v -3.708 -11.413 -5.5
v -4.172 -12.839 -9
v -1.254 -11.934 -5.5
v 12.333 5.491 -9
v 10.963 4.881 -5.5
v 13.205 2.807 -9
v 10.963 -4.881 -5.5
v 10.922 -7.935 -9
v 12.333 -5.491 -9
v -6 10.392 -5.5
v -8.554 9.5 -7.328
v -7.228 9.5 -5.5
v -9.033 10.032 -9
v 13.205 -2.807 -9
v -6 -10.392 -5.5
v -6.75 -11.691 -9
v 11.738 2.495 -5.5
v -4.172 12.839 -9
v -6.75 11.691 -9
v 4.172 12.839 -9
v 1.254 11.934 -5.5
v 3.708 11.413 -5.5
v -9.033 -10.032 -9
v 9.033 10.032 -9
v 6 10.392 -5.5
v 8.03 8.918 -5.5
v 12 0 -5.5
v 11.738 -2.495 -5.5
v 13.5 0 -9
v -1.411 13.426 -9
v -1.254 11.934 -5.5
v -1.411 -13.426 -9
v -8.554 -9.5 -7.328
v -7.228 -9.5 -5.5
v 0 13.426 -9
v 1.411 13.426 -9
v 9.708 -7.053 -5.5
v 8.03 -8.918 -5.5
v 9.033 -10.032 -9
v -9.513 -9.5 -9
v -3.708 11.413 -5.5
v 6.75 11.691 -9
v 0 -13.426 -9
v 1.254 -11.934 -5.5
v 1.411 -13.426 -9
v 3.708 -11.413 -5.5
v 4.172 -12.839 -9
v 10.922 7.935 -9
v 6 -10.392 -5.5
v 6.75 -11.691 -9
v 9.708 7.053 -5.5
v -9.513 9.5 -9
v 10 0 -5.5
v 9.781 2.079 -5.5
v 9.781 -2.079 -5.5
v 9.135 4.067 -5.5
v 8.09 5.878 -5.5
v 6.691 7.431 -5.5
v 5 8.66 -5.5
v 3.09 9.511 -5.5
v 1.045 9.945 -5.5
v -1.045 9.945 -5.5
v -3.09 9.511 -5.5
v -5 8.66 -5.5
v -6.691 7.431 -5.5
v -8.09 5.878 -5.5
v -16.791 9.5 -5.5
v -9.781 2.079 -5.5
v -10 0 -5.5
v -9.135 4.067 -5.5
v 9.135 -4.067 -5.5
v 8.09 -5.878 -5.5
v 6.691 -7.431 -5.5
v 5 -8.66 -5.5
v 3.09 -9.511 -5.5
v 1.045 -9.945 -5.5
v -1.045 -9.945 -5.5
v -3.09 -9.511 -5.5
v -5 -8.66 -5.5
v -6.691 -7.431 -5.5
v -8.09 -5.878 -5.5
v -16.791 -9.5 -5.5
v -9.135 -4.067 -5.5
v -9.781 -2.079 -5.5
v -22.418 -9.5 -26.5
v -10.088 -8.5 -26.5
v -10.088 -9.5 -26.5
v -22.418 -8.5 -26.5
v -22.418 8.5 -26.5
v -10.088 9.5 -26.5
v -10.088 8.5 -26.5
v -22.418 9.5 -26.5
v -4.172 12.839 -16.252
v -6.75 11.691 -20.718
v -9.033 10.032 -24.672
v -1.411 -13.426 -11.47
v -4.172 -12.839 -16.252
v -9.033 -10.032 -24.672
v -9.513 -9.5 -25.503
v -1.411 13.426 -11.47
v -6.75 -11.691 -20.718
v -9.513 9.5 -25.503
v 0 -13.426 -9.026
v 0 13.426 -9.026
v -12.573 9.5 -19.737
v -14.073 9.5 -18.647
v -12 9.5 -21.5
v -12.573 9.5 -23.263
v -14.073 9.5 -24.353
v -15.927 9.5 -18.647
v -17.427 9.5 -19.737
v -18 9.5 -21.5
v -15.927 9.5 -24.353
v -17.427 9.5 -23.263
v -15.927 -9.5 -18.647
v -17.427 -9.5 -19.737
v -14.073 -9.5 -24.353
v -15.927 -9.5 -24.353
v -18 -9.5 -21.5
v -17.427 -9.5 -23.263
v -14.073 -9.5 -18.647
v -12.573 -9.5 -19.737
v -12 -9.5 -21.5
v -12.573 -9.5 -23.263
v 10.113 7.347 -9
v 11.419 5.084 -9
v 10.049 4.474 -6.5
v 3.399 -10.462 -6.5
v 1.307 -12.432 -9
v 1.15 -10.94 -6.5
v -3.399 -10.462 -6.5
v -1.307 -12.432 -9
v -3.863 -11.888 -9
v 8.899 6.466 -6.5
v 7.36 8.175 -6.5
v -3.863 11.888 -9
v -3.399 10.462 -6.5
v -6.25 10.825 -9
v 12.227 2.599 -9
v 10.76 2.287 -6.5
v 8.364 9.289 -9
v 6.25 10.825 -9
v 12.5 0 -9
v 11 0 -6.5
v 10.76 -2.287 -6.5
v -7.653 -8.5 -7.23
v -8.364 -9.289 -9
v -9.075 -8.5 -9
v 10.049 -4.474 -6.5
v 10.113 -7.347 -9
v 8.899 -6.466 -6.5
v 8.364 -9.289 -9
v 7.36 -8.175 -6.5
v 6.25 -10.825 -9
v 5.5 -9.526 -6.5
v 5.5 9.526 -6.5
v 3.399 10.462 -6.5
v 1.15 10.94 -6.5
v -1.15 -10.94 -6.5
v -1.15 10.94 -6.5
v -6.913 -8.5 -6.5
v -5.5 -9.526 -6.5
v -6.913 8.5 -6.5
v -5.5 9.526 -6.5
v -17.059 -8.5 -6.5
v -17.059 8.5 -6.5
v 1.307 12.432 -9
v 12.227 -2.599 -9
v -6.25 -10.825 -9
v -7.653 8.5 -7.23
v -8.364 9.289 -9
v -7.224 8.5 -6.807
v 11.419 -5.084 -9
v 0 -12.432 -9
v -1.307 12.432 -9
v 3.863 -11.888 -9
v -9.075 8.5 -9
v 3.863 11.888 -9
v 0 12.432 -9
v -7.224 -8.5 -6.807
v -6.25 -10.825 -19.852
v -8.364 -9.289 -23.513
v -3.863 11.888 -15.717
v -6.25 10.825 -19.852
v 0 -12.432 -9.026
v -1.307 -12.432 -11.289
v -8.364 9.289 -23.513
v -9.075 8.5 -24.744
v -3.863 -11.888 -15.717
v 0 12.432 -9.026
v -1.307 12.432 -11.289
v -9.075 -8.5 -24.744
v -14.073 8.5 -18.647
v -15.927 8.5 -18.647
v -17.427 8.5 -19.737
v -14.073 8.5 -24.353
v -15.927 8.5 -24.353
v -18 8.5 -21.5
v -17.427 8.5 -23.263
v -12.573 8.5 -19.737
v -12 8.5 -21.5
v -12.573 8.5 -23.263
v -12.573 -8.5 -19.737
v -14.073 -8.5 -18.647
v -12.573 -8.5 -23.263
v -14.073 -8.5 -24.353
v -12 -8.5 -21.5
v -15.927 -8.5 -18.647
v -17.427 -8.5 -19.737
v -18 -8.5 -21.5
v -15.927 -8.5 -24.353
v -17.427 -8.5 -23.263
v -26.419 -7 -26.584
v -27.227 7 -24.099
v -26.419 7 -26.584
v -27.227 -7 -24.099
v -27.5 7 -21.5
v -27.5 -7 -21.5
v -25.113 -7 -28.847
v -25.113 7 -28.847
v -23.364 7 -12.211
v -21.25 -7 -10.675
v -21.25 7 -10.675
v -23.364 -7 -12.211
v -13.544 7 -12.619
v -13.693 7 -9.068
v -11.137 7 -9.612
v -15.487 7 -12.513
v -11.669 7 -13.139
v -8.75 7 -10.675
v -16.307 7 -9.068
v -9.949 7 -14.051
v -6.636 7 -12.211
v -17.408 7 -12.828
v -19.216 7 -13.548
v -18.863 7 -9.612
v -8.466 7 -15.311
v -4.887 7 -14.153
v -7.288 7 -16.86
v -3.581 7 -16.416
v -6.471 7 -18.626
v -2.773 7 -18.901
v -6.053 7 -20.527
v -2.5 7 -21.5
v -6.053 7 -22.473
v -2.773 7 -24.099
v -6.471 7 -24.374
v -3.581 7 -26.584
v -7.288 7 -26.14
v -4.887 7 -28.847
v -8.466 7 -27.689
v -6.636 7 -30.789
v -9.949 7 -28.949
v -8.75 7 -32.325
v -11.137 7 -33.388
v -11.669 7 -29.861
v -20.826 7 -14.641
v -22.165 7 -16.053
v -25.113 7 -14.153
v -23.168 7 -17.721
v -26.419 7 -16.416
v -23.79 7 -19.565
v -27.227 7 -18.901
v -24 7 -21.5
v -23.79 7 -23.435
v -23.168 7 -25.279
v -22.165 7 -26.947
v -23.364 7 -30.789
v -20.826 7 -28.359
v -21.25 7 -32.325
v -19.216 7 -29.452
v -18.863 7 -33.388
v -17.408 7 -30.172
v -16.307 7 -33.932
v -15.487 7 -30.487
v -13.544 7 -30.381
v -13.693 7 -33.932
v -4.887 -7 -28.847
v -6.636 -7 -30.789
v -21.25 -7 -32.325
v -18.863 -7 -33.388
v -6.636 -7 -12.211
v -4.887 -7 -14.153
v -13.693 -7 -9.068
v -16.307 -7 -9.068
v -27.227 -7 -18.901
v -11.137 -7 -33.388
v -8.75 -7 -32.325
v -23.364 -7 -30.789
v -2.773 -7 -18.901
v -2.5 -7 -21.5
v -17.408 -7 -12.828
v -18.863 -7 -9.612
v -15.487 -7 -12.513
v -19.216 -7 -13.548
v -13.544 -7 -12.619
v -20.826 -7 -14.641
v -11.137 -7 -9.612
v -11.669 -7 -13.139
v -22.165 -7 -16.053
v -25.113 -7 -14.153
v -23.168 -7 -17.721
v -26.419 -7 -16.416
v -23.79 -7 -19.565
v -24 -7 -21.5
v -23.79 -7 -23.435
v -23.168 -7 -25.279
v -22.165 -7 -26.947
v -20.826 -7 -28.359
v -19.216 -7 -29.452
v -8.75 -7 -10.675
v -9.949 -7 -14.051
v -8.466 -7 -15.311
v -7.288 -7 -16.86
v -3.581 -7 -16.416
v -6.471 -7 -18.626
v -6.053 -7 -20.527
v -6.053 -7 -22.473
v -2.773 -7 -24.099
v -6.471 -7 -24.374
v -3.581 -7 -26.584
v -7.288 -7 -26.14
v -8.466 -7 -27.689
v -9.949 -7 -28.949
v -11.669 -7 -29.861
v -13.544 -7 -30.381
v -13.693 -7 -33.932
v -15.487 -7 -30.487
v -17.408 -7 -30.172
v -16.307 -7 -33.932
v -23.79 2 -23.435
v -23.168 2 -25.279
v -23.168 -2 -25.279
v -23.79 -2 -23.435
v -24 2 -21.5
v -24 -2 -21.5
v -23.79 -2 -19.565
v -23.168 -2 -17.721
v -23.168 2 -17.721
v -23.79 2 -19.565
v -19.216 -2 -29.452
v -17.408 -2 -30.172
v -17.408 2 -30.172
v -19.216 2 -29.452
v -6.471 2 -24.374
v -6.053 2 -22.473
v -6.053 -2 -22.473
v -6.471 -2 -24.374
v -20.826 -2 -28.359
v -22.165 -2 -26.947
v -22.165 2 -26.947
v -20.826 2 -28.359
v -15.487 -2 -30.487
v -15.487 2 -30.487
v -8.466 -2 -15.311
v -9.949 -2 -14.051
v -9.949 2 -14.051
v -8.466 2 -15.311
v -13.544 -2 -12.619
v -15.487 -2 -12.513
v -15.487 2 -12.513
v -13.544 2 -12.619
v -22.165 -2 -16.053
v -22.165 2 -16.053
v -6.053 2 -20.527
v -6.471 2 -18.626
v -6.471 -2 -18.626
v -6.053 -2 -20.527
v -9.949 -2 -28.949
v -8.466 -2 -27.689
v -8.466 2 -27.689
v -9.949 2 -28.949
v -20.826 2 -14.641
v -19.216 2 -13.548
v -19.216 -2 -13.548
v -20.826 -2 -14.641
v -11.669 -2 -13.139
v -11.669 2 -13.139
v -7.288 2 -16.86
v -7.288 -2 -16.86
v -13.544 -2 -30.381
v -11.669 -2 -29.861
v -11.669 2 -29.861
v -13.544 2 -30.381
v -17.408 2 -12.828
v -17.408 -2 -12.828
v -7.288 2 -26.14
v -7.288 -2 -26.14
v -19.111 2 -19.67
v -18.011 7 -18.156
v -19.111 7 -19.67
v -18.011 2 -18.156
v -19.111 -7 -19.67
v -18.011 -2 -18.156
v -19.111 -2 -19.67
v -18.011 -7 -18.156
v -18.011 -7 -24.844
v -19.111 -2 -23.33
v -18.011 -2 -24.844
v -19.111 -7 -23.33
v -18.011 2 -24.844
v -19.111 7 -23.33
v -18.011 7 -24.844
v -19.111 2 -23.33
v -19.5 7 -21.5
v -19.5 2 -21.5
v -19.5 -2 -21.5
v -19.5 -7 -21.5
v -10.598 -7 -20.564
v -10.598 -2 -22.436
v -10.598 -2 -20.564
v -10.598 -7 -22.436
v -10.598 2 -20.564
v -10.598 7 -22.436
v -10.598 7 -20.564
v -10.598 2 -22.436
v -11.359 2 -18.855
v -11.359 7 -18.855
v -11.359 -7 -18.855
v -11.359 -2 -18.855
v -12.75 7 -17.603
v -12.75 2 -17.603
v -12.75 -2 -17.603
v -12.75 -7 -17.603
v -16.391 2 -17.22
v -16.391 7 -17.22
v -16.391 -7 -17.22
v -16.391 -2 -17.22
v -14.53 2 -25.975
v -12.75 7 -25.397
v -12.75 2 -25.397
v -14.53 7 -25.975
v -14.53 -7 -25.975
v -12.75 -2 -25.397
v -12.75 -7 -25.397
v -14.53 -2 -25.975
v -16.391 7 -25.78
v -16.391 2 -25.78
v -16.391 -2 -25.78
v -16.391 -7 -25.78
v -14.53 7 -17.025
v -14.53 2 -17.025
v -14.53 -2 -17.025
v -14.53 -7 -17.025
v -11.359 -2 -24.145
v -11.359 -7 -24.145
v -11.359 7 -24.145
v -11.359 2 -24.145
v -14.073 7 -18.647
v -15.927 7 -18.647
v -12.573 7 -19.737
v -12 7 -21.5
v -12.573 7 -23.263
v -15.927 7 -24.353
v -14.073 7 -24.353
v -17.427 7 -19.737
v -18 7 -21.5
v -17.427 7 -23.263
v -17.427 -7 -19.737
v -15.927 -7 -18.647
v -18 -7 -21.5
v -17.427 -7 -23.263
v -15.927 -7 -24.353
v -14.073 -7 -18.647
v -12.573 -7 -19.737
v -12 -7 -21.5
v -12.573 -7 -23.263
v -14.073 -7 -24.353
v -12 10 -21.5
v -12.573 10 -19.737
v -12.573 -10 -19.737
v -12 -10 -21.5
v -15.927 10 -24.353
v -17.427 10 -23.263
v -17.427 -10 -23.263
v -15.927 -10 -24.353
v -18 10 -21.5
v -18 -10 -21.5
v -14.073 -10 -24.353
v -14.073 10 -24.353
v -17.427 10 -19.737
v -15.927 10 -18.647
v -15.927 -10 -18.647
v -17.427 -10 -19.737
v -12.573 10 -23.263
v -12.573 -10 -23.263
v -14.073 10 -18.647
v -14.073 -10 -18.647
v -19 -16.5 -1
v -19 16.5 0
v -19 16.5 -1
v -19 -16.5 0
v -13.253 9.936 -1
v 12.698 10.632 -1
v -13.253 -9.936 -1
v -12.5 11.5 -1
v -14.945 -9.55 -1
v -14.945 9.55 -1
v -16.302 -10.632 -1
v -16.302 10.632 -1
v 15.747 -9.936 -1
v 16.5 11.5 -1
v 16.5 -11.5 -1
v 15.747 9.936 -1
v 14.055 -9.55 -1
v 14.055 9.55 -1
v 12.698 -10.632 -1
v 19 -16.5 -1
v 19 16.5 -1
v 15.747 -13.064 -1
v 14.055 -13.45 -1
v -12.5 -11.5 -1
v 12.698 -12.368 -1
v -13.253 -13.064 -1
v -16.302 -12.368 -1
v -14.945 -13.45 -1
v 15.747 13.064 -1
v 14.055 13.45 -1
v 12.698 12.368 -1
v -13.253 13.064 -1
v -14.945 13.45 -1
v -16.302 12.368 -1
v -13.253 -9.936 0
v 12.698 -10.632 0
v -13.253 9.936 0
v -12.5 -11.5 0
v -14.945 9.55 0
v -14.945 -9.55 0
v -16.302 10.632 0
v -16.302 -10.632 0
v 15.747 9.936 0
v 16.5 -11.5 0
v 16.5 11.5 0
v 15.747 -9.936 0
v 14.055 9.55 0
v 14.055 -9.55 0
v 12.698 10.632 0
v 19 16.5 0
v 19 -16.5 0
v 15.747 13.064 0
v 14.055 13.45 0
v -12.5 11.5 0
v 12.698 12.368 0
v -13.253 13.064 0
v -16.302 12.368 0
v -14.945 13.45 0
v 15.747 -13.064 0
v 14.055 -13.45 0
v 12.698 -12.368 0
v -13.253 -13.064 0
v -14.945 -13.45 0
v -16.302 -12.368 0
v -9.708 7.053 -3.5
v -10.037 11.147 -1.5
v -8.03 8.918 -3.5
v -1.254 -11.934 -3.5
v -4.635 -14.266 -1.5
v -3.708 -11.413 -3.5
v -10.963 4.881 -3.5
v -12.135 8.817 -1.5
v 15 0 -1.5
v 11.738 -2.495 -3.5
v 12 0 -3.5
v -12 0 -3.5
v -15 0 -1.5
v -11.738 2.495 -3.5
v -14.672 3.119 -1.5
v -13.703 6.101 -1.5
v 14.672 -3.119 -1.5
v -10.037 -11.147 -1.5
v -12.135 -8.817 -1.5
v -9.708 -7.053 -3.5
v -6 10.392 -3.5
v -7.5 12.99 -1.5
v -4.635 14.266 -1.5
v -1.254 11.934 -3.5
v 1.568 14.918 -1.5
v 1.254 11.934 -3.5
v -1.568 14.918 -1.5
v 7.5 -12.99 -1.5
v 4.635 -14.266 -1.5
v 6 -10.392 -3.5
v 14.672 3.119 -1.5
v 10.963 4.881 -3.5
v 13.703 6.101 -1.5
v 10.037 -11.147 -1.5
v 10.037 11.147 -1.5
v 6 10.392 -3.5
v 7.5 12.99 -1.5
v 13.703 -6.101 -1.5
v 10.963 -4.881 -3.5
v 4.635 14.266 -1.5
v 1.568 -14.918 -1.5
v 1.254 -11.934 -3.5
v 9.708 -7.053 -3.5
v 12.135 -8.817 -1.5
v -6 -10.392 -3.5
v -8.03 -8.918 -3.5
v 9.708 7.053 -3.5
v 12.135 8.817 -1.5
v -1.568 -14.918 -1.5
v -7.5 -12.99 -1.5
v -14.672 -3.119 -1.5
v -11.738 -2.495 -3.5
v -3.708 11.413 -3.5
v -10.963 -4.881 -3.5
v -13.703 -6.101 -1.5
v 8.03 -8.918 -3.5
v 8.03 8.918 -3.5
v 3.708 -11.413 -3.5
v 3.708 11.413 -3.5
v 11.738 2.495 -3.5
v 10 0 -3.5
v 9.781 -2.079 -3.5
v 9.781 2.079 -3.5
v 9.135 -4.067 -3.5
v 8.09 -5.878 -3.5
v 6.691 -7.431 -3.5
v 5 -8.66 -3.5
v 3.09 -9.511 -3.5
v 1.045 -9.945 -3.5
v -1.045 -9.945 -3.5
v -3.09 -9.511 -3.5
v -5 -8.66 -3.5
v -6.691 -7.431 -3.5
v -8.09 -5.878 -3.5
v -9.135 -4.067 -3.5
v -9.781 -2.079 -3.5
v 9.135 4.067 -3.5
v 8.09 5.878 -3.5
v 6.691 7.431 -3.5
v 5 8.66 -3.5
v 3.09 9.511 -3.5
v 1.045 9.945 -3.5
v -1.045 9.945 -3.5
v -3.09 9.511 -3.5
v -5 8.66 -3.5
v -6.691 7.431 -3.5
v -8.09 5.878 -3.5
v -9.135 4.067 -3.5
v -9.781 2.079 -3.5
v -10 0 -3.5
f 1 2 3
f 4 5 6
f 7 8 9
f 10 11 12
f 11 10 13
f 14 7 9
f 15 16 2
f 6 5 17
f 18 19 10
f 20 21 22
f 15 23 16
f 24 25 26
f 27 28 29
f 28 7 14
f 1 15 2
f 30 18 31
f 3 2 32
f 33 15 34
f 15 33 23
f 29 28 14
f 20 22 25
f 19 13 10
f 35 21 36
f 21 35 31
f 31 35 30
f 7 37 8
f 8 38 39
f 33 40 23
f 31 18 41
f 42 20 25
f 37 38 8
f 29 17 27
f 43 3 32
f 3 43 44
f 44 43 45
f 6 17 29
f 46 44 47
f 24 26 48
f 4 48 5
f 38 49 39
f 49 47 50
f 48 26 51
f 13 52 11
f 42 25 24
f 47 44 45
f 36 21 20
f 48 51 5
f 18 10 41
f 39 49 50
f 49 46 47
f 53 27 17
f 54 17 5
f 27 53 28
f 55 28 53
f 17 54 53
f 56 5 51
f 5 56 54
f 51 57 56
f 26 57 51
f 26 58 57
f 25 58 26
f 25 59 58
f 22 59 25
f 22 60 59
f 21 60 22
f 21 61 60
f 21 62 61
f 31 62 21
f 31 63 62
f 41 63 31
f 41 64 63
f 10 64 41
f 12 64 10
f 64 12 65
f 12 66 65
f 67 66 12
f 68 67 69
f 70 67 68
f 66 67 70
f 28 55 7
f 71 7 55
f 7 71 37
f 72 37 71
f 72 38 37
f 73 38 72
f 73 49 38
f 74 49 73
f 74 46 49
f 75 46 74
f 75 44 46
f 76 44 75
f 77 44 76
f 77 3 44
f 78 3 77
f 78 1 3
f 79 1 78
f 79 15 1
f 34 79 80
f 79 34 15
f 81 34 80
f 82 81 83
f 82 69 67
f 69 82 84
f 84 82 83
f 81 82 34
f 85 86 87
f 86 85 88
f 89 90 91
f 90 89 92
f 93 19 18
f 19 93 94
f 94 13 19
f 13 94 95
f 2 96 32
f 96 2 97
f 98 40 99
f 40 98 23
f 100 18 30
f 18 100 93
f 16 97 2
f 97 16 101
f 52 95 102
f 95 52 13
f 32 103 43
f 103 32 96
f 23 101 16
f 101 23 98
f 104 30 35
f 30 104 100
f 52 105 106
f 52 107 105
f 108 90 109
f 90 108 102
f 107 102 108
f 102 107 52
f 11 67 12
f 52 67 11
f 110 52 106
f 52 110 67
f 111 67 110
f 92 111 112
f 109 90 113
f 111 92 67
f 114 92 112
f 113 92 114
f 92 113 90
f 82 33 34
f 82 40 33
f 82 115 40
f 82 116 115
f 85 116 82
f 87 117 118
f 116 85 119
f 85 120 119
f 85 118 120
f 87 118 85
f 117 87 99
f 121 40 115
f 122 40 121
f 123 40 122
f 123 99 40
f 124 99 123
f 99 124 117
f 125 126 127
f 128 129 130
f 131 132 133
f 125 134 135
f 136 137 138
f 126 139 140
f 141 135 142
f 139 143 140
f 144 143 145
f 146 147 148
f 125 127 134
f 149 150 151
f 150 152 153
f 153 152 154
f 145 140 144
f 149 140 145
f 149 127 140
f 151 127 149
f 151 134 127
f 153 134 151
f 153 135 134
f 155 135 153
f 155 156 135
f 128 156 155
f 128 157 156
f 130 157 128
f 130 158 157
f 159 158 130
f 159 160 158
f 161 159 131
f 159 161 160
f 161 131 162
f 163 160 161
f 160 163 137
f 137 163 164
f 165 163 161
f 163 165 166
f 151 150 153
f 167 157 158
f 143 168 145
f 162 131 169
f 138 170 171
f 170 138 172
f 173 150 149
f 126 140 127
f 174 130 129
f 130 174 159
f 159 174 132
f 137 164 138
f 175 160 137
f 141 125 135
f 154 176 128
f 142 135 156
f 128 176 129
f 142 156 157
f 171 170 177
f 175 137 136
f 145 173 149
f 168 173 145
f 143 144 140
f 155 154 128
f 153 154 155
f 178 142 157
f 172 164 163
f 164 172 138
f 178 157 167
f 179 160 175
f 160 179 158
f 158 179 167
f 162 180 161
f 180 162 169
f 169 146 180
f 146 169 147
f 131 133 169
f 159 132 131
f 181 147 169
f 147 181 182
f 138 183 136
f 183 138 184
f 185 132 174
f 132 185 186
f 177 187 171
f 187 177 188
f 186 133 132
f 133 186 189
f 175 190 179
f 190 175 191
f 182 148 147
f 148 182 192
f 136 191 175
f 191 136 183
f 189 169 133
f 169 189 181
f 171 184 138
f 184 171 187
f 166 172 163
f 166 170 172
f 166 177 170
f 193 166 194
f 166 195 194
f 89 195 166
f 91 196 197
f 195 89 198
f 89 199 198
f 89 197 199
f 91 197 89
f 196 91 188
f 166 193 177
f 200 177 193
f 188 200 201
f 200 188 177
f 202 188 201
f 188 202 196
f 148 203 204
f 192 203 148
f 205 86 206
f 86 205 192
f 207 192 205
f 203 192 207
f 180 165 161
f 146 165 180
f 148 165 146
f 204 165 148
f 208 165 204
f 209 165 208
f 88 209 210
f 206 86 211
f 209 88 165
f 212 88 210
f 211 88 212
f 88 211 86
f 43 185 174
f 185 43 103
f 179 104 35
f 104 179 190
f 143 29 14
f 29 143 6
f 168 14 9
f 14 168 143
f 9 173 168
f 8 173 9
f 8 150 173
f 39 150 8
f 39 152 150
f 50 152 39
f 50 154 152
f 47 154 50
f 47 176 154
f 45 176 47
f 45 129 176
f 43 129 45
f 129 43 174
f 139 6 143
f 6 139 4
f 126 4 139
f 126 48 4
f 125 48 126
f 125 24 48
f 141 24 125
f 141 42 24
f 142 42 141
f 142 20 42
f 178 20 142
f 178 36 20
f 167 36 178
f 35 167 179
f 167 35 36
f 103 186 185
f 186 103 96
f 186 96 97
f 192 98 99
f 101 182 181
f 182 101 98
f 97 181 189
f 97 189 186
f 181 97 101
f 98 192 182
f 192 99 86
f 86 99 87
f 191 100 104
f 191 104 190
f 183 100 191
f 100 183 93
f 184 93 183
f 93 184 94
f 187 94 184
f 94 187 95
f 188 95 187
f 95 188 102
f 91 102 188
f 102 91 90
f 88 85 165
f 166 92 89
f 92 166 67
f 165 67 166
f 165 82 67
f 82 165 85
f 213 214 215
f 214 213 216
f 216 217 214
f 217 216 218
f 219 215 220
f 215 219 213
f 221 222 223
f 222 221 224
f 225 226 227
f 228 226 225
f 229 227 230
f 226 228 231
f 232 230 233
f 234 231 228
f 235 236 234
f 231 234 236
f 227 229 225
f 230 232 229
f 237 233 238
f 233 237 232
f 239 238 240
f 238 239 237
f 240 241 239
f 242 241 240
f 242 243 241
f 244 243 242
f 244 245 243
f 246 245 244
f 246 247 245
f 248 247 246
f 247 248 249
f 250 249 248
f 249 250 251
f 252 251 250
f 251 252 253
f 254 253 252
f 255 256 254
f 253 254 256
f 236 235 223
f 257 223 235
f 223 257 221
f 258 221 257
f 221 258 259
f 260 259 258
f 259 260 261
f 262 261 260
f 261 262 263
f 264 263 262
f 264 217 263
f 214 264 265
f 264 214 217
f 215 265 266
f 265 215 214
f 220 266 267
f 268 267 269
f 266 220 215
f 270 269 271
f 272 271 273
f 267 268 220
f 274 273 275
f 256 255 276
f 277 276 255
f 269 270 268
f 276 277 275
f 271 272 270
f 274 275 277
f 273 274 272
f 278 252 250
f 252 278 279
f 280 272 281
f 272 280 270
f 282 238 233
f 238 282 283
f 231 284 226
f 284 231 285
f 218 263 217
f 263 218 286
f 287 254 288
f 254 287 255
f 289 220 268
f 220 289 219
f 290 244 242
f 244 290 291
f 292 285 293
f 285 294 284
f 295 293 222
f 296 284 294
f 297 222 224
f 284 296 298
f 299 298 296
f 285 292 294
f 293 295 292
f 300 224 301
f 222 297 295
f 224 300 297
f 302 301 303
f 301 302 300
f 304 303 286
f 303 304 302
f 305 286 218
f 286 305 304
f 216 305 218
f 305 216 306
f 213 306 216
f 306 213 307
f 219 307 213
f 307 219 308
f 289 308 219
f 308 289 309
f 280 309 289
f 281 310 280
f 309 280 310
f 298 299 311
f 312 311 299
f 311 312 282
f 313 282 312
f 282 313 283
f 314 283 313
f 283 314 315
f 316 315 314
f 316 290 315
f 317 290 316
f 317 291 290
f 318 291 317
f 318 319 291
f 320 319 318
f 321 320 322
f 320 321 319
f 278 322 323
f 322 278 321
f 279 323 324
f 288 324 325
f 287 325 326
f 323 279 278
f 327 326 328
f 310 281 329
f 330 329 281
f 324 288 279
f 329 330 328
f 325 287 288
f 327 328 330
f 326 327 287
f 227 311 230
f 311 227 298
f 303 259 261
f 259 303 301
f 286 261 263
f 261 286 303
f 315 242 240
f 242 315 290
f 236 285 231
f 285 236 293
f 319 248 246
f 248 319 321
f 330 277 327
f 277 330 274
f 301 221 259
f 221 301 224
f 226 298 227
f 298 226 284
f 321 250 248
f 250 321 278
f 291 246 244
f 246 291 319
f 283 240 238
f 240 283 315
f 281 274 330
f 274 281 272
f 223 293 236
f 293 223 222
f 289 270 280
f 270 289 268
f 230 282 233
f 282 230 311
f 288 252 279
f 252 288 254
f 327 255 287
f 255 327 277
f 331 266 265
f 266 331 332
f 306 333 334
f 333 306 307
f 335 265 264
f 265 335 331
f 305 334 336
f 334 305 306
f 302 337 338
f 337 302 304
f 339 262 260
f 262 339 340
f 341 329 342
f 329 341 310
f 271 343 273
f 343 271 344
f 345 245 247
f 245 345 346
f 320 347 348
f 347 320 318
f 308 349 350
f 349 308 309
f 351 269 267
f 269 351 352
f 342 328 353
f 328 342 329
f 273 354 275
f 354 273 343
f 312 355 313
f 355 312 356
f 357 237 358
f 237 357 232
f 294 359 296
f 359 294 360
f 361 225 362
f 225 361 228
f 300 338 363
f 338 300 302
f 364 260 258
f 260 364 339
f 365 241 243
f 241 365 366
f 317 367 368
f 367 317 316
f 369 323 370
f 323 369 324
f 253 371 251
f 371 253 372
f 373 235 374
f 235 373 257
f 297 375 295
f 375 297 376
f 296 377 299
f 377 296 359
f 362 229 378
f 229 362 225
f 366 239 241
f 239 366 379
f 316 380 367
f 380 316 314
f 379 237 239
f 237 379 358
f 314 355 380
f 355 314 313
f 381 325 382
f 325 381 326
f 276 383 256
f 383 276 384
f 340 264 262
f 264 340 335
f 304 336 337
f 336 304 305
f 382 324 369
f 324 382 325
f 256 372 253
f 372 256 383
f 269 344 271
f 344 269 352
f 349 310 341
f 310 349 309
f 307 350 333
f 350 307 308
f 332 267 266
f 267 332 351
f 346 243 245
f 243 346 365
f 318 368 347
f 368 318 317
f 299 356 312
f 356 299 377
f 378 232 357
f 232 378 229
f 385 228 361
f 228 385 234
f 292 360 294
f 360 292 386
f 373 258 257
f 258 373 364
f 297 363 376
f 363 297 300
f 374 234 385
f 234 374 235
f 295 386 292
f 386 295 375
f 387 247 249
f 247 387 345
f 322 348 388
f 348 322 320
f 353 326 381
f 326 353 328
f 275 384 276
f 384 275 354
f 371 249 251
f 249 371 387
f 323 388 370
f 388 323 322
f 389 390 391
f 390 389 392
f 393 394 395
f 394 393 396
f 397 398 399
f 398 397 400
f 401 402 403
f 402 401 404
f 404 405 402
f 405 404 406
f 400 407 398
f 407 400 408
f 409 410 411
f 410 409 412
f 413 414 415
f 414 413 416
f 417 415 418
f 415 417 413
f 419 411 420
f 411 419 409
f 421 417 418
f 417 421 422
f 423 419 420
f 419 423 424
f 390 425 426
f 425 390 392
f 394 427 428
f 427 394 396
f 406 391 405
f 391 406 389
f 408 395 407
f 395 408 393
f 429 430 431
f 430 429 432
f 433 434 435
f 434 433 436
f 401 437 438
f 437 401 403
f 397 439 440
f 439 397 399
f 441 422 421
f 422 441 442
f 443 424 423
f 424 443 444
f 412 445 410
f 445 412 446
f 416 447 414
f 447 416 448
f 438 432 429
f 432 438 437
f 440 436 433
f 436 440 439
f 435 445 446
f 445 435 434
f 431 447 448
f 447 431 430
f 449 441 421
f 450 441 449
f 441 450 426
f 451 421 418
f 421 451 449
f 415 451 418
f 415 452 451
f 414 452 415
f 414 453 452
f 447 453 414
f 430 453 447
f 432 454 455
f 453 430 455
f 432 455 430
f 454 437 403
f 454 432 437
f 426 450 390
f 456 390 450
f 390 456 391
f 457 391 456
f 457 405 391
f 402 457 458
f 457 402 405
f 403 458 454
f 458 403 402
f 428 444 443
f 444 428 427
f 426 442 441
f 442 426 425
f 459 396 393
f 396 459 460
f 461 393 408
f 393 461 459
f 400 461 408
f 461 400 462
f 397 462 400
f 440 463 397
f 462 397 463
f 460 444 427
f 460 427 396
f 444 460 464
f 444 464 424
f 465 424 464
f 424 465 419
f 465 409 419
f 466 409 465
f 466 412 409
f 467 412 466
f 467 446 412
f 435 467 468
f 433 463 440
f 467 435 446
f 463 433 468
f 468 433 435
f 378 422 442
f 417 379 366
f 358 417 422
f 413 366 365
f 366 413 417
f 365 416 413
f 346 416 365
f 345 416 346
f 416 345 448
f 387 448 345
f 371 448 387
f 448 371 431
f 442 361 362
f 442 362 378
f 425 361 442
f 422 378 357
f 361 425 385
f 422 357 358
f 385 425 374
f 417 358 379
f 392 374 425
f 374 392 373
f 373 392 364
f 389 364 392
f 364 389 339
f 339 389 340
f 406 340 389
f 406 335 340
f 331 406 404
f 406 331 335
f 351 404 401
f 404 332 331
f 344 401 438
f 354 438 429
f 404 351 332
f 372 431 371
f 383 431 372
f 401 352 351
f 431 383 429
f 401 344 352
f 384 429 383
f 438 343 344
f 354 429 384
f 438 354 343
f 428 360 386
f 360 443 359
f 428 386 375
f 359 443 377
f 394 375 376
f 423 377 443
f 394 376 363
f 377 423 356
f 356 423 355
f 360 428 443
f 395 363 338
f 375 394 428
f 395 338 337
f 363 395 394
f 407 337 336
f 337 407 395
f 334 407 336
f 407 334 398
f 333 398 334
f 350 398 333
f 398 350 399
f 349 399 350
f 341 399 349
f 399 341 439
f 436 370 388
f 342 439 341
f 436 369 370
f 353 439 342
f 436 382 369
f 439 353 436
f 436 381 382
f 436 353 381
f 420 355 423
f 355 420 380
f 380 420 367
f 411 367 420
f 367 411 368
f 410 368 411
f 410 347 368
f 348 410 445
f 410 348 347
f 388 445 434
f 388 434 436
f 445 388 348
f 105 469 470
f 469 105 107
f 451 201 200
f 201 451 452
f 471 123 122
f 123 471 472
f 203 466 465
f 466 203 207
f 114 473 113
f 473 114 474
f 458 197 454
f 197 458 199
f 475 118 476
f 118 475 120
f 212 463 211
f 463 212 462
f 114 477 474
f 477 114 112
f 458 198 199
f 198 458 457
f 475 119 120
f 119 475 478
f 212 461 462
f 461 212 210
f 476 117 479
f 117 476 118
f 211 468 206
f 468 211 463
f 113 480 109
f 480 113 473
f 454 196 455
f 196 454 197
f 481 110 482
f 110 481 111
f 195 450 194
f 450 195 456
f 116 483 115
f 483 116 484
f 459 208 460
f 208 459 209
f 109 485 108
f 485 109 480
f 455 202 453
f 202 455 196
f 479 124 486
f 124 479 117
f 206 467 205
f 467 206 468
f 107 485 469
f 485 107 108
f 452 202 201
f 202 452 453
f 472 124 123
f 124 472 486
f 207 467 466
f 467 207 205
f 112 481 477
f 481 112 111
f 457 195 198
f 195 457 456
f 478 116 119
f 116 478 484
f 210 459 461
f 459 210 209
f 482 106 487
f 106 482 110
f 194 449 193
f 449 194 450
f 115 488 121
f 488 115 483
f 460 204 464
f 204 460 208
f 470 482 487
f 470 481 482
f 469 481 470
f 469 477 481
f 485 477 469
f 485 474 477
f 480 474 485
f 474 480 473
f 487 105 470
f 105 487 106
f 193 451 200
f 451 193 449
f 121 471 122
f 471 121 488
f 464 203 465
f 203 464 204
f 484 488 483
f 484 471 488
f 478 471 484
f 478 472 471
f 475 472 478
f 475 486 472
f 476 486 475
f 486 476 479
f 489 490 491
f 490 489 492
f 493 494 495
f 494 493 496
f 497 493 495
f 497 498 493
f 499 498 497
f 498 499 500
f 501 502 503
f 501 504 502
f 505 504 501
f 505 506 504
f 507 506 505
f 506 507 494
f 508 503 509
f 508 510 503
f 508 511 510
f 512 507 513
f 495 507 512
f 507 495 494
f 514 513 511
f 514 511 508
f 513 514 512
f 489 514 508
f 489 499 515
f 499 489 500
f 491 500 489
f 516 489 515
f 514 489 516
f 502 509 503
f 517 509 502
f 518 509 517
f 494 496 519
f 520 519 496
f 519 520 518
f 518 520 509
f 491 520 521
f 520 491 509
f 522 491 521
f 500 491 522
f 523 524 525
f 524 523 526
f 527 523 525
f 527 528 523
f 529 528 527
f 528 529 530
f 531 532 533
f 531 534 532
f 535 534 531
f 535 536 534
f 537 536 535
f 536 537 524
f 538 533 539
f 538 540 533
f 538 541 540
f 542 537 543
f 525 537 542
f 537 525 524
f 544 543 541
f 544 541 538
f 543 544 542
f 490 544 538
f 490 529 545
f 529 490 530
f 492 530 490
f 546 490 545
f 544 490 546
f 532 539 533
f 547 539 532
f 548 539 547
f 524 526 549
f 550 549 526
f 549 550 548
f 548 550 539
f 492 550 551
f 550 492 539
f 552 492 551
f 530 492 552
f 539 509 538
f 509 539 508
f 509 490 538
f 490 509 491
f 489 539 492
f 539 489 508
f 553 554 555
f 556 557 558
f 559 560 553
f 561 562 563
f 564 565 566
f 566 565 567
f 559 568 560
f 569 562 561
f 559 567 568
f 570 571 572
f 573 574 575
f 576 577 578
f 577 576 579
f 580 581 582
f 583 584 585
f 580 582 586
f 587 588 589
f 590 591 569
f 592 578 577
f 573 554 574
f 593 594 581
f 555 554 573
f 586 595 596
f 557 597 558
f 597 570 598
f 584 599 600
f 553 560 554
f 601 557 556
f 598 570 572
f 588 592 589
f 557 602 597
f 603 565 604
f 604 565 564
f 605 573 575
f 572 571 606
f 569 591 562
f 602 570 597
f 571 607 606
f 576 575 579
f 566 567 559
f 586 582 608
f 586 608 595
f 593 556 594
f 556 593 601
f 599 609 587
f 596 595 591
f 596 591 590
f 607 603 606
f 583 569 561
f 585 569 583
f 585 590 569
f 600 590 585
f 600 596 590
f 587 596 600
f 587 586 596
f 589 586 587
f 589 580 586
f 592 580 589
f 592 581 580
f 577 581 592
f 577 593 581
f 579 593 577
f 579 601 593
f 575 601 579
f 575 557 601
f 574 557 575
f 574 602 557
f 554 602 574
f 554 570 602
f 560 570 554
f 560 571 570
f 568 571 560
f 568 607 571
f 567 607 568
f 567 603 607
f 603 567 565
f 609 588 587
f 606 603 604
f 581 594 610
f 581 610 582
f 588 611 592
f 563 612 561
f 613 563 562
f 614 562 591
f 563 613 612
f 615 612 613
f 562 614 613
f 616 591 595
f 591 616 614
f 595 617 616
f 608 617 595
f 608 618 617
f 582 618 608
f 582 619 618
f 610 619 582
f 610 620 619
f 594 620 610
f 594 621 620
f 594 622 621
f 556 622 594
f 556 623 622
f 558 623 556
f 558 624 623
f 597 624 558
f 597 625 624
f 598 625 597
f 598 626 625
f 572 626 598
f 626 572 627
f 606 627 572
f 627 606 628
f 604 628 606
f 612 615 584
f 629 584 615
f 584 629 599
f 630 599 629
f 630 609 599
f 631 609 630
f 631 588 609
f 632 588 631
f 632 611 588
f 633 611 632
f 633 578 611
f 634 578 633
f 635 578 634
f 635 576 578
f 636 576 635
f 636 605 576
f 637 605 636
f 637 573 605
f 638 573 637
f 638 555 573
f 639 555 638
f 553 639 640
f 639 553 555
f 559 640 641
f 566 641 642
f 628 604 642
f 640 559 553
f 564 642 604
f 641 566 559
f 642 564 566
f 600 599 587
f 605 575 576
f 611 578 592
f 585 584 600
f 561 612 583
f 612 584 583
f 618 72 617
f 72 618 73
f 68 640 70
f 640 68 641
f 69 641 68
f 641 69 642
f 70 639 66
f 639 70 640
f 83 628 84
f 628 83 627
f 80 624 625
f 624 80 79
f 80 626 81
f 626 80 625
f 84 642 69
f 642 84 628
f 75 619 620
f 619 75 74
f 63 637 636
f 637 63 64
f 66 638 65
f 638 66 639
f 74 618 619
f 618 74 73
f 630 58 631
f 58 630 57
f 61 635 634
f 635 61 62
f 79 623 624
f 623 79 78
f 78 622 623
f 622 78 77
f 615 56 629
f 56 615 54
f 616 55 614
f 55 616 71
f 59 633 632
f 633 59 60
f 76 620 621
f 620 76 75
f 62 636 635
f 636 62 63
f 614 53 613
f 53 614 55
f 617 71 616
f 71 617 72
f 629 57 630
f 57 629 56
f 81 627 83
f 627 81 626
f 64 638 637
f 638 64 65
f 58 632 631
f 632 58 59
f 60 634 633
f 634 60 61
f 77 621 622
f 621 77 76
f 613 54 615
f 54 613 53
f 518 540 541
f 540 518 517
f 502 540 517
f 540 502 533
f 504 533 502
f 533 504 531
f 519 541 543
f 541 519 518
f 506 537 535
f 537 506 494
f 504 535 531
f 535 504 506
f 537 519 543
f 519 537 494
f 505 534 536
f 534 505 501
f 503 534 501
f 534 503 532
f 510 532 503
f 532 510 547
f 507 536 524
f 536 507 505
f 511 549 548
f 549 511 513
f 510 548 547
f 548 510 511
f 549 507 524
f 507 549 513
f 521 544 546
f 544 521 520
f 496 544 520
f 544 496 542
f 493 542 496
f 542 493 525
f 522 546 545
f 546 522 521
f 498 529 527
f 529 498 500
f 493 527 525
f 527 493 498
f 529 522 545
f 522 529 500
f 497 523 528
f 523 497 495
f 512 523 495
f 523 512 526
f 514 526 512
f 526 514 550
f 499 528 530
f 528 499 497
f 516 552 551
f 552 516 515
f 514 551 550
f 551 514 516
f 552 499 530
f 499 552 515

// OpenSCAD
module back_wheel_srew_holes() {
    left = 33/2-3-2;
    forward = 20-2.5-3;
    translate([0,0,-2]) {
        translate([forward,left,0]) cylinder(50,2,2);
        translate([forward,-left,0]) cylinder(50,2,2);
        translate([-forward,left,0]) cylinder(50,2,2);
        translate([-forward,-left,0]) cylinder(50,2,2);
    }
}

module back_wheel() {
    difference() {
         mirror([1,0,0]) mirror([0,0,1]) translate([0,0,0.5]) {

            cube([38,33,1], center=true);
            translate([0,0,1]) cylinder(2,15,12);

            translate([0,0,1]) cylinder(2,15,12);
            translate([0,0,3]) cylinder(2,10,10);
            translate([0,0,5]) {
                difference() {
                    union() {
                        cylinder(3.5,12,13.5);
                        translate([0,0,3.5]) cylinder(17.5,13.5,13.5);
                        translate([9,0,10.5]) cube([28,19,21], center=true);
                    }        
                    translate([0,0,1]) cylinder(2.5,11,12.5);
                    translate([0,0,3.5]) cylinder(17.5,12.5,12.5);
                    translate([9,0,11.5]) cube([28,17,21], center=true);
                    translate([-15,0,18.5]) cube([30,30,30], center=true);
                    translate([-5.5,0,24]) rotate([0,30,0]) cube([30,30,30], center=true);
                    translate([35,0,10]) rotate([0,15,0]) cube([30,30,30], center=true);
                }
            }

            translate([15,0,21]) rotate([90,0,0]) {
                difference() {
                    cylinder(14,12.5,12.5, center=true);
                    cylinder(14,9,9, center=true);
                }
                cylinder(14,4.5,4.5, center=true);
                cylinder(4,9,9, center=true);
                cylinder(20,3,3, center=true);
            }
            
        }
        back_wheel_srew_holes();
    }
}  
   

back_wheel();
